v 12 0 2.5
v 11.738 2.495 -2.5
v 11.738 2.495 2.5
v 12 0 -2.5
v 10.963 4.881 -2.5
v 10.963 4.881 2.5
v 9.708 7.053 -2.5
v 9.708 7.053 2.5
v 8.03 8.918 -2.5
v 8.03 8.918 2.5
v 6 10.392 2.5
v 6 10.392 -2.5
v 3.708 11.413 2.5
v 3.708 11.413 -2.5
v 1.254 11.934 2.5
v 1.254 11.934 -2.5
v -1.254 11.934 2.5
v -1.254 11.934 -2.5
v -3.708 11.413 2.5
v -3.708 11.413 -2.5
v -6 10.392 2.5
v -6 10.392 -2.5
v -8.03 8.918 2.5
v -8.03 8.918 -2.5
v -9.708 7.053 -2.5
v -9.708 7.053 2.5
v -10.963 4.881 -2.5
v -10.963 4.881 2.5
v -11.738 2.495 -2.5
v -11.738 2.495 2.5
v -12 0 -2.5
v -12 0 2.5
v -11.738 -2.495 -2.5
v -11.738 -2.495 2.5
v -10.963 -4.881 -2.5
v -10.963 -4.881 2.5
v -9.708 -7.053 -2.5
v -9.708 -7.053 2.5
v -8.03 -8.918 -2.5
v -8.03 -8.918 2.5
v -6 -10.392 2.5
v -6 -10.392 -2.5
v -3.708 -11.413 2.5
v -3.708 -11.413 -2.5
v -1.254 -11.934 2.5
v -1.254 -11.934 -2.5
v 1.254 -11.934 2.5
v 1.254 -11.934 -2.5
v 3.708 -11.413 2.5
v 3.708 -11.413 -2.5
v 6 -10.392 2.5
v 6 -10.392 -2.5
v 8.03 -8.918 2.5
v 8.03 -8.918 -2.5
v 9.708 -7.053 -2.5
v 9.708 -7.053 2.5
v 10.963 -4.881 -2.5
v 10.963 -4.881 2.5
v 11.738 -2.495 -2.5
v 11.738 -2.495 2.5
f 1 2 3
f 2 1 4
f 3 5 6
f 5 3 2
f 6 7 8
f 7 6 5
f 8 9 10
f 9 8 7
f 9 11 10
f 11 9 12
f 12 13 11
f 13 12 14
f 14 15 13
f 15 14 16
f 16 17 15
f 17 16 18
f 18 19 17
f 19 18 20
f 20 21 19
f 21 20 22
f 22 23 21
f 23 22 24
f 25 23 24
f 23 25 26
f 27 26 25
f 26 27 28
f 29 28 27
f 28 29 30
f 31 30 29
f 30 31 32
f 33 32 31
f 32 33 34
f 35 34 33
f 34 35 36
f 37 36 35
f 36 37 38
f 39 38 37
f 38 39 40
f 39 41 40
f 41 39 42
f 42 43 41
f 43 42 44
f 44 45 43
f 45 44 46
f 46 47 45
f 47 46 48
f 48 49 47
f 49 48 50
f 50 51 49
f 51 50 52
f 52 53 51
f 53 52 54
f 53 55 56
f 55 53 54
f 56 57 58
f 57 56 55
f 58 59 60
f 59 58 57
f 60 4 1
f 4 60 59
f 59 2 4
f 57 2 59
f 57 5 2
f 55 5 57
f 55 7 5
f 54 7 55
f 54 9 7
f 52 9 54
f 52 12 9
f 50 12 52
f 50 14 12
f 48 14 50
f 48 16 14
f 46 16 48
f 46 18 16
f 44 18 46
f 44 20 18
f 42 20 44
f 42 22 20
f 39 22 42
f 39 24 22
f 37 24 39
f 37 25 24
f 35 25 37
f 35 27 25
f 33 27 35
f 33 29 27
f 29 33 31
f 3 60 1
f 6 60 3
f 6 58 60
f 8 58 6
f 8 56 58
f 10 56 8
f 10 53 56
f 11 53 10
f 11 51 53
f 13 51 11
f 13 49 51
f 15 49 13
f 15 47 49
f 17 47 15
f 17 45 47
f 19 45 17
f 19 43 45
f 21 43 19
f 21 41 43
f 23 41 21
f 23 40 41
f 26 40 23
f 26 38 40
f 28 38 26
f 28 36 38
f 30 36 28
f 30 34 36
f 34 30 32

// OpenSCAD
// Generated by generate_scads.py
cylinder(h=5, r=12, center=true);
